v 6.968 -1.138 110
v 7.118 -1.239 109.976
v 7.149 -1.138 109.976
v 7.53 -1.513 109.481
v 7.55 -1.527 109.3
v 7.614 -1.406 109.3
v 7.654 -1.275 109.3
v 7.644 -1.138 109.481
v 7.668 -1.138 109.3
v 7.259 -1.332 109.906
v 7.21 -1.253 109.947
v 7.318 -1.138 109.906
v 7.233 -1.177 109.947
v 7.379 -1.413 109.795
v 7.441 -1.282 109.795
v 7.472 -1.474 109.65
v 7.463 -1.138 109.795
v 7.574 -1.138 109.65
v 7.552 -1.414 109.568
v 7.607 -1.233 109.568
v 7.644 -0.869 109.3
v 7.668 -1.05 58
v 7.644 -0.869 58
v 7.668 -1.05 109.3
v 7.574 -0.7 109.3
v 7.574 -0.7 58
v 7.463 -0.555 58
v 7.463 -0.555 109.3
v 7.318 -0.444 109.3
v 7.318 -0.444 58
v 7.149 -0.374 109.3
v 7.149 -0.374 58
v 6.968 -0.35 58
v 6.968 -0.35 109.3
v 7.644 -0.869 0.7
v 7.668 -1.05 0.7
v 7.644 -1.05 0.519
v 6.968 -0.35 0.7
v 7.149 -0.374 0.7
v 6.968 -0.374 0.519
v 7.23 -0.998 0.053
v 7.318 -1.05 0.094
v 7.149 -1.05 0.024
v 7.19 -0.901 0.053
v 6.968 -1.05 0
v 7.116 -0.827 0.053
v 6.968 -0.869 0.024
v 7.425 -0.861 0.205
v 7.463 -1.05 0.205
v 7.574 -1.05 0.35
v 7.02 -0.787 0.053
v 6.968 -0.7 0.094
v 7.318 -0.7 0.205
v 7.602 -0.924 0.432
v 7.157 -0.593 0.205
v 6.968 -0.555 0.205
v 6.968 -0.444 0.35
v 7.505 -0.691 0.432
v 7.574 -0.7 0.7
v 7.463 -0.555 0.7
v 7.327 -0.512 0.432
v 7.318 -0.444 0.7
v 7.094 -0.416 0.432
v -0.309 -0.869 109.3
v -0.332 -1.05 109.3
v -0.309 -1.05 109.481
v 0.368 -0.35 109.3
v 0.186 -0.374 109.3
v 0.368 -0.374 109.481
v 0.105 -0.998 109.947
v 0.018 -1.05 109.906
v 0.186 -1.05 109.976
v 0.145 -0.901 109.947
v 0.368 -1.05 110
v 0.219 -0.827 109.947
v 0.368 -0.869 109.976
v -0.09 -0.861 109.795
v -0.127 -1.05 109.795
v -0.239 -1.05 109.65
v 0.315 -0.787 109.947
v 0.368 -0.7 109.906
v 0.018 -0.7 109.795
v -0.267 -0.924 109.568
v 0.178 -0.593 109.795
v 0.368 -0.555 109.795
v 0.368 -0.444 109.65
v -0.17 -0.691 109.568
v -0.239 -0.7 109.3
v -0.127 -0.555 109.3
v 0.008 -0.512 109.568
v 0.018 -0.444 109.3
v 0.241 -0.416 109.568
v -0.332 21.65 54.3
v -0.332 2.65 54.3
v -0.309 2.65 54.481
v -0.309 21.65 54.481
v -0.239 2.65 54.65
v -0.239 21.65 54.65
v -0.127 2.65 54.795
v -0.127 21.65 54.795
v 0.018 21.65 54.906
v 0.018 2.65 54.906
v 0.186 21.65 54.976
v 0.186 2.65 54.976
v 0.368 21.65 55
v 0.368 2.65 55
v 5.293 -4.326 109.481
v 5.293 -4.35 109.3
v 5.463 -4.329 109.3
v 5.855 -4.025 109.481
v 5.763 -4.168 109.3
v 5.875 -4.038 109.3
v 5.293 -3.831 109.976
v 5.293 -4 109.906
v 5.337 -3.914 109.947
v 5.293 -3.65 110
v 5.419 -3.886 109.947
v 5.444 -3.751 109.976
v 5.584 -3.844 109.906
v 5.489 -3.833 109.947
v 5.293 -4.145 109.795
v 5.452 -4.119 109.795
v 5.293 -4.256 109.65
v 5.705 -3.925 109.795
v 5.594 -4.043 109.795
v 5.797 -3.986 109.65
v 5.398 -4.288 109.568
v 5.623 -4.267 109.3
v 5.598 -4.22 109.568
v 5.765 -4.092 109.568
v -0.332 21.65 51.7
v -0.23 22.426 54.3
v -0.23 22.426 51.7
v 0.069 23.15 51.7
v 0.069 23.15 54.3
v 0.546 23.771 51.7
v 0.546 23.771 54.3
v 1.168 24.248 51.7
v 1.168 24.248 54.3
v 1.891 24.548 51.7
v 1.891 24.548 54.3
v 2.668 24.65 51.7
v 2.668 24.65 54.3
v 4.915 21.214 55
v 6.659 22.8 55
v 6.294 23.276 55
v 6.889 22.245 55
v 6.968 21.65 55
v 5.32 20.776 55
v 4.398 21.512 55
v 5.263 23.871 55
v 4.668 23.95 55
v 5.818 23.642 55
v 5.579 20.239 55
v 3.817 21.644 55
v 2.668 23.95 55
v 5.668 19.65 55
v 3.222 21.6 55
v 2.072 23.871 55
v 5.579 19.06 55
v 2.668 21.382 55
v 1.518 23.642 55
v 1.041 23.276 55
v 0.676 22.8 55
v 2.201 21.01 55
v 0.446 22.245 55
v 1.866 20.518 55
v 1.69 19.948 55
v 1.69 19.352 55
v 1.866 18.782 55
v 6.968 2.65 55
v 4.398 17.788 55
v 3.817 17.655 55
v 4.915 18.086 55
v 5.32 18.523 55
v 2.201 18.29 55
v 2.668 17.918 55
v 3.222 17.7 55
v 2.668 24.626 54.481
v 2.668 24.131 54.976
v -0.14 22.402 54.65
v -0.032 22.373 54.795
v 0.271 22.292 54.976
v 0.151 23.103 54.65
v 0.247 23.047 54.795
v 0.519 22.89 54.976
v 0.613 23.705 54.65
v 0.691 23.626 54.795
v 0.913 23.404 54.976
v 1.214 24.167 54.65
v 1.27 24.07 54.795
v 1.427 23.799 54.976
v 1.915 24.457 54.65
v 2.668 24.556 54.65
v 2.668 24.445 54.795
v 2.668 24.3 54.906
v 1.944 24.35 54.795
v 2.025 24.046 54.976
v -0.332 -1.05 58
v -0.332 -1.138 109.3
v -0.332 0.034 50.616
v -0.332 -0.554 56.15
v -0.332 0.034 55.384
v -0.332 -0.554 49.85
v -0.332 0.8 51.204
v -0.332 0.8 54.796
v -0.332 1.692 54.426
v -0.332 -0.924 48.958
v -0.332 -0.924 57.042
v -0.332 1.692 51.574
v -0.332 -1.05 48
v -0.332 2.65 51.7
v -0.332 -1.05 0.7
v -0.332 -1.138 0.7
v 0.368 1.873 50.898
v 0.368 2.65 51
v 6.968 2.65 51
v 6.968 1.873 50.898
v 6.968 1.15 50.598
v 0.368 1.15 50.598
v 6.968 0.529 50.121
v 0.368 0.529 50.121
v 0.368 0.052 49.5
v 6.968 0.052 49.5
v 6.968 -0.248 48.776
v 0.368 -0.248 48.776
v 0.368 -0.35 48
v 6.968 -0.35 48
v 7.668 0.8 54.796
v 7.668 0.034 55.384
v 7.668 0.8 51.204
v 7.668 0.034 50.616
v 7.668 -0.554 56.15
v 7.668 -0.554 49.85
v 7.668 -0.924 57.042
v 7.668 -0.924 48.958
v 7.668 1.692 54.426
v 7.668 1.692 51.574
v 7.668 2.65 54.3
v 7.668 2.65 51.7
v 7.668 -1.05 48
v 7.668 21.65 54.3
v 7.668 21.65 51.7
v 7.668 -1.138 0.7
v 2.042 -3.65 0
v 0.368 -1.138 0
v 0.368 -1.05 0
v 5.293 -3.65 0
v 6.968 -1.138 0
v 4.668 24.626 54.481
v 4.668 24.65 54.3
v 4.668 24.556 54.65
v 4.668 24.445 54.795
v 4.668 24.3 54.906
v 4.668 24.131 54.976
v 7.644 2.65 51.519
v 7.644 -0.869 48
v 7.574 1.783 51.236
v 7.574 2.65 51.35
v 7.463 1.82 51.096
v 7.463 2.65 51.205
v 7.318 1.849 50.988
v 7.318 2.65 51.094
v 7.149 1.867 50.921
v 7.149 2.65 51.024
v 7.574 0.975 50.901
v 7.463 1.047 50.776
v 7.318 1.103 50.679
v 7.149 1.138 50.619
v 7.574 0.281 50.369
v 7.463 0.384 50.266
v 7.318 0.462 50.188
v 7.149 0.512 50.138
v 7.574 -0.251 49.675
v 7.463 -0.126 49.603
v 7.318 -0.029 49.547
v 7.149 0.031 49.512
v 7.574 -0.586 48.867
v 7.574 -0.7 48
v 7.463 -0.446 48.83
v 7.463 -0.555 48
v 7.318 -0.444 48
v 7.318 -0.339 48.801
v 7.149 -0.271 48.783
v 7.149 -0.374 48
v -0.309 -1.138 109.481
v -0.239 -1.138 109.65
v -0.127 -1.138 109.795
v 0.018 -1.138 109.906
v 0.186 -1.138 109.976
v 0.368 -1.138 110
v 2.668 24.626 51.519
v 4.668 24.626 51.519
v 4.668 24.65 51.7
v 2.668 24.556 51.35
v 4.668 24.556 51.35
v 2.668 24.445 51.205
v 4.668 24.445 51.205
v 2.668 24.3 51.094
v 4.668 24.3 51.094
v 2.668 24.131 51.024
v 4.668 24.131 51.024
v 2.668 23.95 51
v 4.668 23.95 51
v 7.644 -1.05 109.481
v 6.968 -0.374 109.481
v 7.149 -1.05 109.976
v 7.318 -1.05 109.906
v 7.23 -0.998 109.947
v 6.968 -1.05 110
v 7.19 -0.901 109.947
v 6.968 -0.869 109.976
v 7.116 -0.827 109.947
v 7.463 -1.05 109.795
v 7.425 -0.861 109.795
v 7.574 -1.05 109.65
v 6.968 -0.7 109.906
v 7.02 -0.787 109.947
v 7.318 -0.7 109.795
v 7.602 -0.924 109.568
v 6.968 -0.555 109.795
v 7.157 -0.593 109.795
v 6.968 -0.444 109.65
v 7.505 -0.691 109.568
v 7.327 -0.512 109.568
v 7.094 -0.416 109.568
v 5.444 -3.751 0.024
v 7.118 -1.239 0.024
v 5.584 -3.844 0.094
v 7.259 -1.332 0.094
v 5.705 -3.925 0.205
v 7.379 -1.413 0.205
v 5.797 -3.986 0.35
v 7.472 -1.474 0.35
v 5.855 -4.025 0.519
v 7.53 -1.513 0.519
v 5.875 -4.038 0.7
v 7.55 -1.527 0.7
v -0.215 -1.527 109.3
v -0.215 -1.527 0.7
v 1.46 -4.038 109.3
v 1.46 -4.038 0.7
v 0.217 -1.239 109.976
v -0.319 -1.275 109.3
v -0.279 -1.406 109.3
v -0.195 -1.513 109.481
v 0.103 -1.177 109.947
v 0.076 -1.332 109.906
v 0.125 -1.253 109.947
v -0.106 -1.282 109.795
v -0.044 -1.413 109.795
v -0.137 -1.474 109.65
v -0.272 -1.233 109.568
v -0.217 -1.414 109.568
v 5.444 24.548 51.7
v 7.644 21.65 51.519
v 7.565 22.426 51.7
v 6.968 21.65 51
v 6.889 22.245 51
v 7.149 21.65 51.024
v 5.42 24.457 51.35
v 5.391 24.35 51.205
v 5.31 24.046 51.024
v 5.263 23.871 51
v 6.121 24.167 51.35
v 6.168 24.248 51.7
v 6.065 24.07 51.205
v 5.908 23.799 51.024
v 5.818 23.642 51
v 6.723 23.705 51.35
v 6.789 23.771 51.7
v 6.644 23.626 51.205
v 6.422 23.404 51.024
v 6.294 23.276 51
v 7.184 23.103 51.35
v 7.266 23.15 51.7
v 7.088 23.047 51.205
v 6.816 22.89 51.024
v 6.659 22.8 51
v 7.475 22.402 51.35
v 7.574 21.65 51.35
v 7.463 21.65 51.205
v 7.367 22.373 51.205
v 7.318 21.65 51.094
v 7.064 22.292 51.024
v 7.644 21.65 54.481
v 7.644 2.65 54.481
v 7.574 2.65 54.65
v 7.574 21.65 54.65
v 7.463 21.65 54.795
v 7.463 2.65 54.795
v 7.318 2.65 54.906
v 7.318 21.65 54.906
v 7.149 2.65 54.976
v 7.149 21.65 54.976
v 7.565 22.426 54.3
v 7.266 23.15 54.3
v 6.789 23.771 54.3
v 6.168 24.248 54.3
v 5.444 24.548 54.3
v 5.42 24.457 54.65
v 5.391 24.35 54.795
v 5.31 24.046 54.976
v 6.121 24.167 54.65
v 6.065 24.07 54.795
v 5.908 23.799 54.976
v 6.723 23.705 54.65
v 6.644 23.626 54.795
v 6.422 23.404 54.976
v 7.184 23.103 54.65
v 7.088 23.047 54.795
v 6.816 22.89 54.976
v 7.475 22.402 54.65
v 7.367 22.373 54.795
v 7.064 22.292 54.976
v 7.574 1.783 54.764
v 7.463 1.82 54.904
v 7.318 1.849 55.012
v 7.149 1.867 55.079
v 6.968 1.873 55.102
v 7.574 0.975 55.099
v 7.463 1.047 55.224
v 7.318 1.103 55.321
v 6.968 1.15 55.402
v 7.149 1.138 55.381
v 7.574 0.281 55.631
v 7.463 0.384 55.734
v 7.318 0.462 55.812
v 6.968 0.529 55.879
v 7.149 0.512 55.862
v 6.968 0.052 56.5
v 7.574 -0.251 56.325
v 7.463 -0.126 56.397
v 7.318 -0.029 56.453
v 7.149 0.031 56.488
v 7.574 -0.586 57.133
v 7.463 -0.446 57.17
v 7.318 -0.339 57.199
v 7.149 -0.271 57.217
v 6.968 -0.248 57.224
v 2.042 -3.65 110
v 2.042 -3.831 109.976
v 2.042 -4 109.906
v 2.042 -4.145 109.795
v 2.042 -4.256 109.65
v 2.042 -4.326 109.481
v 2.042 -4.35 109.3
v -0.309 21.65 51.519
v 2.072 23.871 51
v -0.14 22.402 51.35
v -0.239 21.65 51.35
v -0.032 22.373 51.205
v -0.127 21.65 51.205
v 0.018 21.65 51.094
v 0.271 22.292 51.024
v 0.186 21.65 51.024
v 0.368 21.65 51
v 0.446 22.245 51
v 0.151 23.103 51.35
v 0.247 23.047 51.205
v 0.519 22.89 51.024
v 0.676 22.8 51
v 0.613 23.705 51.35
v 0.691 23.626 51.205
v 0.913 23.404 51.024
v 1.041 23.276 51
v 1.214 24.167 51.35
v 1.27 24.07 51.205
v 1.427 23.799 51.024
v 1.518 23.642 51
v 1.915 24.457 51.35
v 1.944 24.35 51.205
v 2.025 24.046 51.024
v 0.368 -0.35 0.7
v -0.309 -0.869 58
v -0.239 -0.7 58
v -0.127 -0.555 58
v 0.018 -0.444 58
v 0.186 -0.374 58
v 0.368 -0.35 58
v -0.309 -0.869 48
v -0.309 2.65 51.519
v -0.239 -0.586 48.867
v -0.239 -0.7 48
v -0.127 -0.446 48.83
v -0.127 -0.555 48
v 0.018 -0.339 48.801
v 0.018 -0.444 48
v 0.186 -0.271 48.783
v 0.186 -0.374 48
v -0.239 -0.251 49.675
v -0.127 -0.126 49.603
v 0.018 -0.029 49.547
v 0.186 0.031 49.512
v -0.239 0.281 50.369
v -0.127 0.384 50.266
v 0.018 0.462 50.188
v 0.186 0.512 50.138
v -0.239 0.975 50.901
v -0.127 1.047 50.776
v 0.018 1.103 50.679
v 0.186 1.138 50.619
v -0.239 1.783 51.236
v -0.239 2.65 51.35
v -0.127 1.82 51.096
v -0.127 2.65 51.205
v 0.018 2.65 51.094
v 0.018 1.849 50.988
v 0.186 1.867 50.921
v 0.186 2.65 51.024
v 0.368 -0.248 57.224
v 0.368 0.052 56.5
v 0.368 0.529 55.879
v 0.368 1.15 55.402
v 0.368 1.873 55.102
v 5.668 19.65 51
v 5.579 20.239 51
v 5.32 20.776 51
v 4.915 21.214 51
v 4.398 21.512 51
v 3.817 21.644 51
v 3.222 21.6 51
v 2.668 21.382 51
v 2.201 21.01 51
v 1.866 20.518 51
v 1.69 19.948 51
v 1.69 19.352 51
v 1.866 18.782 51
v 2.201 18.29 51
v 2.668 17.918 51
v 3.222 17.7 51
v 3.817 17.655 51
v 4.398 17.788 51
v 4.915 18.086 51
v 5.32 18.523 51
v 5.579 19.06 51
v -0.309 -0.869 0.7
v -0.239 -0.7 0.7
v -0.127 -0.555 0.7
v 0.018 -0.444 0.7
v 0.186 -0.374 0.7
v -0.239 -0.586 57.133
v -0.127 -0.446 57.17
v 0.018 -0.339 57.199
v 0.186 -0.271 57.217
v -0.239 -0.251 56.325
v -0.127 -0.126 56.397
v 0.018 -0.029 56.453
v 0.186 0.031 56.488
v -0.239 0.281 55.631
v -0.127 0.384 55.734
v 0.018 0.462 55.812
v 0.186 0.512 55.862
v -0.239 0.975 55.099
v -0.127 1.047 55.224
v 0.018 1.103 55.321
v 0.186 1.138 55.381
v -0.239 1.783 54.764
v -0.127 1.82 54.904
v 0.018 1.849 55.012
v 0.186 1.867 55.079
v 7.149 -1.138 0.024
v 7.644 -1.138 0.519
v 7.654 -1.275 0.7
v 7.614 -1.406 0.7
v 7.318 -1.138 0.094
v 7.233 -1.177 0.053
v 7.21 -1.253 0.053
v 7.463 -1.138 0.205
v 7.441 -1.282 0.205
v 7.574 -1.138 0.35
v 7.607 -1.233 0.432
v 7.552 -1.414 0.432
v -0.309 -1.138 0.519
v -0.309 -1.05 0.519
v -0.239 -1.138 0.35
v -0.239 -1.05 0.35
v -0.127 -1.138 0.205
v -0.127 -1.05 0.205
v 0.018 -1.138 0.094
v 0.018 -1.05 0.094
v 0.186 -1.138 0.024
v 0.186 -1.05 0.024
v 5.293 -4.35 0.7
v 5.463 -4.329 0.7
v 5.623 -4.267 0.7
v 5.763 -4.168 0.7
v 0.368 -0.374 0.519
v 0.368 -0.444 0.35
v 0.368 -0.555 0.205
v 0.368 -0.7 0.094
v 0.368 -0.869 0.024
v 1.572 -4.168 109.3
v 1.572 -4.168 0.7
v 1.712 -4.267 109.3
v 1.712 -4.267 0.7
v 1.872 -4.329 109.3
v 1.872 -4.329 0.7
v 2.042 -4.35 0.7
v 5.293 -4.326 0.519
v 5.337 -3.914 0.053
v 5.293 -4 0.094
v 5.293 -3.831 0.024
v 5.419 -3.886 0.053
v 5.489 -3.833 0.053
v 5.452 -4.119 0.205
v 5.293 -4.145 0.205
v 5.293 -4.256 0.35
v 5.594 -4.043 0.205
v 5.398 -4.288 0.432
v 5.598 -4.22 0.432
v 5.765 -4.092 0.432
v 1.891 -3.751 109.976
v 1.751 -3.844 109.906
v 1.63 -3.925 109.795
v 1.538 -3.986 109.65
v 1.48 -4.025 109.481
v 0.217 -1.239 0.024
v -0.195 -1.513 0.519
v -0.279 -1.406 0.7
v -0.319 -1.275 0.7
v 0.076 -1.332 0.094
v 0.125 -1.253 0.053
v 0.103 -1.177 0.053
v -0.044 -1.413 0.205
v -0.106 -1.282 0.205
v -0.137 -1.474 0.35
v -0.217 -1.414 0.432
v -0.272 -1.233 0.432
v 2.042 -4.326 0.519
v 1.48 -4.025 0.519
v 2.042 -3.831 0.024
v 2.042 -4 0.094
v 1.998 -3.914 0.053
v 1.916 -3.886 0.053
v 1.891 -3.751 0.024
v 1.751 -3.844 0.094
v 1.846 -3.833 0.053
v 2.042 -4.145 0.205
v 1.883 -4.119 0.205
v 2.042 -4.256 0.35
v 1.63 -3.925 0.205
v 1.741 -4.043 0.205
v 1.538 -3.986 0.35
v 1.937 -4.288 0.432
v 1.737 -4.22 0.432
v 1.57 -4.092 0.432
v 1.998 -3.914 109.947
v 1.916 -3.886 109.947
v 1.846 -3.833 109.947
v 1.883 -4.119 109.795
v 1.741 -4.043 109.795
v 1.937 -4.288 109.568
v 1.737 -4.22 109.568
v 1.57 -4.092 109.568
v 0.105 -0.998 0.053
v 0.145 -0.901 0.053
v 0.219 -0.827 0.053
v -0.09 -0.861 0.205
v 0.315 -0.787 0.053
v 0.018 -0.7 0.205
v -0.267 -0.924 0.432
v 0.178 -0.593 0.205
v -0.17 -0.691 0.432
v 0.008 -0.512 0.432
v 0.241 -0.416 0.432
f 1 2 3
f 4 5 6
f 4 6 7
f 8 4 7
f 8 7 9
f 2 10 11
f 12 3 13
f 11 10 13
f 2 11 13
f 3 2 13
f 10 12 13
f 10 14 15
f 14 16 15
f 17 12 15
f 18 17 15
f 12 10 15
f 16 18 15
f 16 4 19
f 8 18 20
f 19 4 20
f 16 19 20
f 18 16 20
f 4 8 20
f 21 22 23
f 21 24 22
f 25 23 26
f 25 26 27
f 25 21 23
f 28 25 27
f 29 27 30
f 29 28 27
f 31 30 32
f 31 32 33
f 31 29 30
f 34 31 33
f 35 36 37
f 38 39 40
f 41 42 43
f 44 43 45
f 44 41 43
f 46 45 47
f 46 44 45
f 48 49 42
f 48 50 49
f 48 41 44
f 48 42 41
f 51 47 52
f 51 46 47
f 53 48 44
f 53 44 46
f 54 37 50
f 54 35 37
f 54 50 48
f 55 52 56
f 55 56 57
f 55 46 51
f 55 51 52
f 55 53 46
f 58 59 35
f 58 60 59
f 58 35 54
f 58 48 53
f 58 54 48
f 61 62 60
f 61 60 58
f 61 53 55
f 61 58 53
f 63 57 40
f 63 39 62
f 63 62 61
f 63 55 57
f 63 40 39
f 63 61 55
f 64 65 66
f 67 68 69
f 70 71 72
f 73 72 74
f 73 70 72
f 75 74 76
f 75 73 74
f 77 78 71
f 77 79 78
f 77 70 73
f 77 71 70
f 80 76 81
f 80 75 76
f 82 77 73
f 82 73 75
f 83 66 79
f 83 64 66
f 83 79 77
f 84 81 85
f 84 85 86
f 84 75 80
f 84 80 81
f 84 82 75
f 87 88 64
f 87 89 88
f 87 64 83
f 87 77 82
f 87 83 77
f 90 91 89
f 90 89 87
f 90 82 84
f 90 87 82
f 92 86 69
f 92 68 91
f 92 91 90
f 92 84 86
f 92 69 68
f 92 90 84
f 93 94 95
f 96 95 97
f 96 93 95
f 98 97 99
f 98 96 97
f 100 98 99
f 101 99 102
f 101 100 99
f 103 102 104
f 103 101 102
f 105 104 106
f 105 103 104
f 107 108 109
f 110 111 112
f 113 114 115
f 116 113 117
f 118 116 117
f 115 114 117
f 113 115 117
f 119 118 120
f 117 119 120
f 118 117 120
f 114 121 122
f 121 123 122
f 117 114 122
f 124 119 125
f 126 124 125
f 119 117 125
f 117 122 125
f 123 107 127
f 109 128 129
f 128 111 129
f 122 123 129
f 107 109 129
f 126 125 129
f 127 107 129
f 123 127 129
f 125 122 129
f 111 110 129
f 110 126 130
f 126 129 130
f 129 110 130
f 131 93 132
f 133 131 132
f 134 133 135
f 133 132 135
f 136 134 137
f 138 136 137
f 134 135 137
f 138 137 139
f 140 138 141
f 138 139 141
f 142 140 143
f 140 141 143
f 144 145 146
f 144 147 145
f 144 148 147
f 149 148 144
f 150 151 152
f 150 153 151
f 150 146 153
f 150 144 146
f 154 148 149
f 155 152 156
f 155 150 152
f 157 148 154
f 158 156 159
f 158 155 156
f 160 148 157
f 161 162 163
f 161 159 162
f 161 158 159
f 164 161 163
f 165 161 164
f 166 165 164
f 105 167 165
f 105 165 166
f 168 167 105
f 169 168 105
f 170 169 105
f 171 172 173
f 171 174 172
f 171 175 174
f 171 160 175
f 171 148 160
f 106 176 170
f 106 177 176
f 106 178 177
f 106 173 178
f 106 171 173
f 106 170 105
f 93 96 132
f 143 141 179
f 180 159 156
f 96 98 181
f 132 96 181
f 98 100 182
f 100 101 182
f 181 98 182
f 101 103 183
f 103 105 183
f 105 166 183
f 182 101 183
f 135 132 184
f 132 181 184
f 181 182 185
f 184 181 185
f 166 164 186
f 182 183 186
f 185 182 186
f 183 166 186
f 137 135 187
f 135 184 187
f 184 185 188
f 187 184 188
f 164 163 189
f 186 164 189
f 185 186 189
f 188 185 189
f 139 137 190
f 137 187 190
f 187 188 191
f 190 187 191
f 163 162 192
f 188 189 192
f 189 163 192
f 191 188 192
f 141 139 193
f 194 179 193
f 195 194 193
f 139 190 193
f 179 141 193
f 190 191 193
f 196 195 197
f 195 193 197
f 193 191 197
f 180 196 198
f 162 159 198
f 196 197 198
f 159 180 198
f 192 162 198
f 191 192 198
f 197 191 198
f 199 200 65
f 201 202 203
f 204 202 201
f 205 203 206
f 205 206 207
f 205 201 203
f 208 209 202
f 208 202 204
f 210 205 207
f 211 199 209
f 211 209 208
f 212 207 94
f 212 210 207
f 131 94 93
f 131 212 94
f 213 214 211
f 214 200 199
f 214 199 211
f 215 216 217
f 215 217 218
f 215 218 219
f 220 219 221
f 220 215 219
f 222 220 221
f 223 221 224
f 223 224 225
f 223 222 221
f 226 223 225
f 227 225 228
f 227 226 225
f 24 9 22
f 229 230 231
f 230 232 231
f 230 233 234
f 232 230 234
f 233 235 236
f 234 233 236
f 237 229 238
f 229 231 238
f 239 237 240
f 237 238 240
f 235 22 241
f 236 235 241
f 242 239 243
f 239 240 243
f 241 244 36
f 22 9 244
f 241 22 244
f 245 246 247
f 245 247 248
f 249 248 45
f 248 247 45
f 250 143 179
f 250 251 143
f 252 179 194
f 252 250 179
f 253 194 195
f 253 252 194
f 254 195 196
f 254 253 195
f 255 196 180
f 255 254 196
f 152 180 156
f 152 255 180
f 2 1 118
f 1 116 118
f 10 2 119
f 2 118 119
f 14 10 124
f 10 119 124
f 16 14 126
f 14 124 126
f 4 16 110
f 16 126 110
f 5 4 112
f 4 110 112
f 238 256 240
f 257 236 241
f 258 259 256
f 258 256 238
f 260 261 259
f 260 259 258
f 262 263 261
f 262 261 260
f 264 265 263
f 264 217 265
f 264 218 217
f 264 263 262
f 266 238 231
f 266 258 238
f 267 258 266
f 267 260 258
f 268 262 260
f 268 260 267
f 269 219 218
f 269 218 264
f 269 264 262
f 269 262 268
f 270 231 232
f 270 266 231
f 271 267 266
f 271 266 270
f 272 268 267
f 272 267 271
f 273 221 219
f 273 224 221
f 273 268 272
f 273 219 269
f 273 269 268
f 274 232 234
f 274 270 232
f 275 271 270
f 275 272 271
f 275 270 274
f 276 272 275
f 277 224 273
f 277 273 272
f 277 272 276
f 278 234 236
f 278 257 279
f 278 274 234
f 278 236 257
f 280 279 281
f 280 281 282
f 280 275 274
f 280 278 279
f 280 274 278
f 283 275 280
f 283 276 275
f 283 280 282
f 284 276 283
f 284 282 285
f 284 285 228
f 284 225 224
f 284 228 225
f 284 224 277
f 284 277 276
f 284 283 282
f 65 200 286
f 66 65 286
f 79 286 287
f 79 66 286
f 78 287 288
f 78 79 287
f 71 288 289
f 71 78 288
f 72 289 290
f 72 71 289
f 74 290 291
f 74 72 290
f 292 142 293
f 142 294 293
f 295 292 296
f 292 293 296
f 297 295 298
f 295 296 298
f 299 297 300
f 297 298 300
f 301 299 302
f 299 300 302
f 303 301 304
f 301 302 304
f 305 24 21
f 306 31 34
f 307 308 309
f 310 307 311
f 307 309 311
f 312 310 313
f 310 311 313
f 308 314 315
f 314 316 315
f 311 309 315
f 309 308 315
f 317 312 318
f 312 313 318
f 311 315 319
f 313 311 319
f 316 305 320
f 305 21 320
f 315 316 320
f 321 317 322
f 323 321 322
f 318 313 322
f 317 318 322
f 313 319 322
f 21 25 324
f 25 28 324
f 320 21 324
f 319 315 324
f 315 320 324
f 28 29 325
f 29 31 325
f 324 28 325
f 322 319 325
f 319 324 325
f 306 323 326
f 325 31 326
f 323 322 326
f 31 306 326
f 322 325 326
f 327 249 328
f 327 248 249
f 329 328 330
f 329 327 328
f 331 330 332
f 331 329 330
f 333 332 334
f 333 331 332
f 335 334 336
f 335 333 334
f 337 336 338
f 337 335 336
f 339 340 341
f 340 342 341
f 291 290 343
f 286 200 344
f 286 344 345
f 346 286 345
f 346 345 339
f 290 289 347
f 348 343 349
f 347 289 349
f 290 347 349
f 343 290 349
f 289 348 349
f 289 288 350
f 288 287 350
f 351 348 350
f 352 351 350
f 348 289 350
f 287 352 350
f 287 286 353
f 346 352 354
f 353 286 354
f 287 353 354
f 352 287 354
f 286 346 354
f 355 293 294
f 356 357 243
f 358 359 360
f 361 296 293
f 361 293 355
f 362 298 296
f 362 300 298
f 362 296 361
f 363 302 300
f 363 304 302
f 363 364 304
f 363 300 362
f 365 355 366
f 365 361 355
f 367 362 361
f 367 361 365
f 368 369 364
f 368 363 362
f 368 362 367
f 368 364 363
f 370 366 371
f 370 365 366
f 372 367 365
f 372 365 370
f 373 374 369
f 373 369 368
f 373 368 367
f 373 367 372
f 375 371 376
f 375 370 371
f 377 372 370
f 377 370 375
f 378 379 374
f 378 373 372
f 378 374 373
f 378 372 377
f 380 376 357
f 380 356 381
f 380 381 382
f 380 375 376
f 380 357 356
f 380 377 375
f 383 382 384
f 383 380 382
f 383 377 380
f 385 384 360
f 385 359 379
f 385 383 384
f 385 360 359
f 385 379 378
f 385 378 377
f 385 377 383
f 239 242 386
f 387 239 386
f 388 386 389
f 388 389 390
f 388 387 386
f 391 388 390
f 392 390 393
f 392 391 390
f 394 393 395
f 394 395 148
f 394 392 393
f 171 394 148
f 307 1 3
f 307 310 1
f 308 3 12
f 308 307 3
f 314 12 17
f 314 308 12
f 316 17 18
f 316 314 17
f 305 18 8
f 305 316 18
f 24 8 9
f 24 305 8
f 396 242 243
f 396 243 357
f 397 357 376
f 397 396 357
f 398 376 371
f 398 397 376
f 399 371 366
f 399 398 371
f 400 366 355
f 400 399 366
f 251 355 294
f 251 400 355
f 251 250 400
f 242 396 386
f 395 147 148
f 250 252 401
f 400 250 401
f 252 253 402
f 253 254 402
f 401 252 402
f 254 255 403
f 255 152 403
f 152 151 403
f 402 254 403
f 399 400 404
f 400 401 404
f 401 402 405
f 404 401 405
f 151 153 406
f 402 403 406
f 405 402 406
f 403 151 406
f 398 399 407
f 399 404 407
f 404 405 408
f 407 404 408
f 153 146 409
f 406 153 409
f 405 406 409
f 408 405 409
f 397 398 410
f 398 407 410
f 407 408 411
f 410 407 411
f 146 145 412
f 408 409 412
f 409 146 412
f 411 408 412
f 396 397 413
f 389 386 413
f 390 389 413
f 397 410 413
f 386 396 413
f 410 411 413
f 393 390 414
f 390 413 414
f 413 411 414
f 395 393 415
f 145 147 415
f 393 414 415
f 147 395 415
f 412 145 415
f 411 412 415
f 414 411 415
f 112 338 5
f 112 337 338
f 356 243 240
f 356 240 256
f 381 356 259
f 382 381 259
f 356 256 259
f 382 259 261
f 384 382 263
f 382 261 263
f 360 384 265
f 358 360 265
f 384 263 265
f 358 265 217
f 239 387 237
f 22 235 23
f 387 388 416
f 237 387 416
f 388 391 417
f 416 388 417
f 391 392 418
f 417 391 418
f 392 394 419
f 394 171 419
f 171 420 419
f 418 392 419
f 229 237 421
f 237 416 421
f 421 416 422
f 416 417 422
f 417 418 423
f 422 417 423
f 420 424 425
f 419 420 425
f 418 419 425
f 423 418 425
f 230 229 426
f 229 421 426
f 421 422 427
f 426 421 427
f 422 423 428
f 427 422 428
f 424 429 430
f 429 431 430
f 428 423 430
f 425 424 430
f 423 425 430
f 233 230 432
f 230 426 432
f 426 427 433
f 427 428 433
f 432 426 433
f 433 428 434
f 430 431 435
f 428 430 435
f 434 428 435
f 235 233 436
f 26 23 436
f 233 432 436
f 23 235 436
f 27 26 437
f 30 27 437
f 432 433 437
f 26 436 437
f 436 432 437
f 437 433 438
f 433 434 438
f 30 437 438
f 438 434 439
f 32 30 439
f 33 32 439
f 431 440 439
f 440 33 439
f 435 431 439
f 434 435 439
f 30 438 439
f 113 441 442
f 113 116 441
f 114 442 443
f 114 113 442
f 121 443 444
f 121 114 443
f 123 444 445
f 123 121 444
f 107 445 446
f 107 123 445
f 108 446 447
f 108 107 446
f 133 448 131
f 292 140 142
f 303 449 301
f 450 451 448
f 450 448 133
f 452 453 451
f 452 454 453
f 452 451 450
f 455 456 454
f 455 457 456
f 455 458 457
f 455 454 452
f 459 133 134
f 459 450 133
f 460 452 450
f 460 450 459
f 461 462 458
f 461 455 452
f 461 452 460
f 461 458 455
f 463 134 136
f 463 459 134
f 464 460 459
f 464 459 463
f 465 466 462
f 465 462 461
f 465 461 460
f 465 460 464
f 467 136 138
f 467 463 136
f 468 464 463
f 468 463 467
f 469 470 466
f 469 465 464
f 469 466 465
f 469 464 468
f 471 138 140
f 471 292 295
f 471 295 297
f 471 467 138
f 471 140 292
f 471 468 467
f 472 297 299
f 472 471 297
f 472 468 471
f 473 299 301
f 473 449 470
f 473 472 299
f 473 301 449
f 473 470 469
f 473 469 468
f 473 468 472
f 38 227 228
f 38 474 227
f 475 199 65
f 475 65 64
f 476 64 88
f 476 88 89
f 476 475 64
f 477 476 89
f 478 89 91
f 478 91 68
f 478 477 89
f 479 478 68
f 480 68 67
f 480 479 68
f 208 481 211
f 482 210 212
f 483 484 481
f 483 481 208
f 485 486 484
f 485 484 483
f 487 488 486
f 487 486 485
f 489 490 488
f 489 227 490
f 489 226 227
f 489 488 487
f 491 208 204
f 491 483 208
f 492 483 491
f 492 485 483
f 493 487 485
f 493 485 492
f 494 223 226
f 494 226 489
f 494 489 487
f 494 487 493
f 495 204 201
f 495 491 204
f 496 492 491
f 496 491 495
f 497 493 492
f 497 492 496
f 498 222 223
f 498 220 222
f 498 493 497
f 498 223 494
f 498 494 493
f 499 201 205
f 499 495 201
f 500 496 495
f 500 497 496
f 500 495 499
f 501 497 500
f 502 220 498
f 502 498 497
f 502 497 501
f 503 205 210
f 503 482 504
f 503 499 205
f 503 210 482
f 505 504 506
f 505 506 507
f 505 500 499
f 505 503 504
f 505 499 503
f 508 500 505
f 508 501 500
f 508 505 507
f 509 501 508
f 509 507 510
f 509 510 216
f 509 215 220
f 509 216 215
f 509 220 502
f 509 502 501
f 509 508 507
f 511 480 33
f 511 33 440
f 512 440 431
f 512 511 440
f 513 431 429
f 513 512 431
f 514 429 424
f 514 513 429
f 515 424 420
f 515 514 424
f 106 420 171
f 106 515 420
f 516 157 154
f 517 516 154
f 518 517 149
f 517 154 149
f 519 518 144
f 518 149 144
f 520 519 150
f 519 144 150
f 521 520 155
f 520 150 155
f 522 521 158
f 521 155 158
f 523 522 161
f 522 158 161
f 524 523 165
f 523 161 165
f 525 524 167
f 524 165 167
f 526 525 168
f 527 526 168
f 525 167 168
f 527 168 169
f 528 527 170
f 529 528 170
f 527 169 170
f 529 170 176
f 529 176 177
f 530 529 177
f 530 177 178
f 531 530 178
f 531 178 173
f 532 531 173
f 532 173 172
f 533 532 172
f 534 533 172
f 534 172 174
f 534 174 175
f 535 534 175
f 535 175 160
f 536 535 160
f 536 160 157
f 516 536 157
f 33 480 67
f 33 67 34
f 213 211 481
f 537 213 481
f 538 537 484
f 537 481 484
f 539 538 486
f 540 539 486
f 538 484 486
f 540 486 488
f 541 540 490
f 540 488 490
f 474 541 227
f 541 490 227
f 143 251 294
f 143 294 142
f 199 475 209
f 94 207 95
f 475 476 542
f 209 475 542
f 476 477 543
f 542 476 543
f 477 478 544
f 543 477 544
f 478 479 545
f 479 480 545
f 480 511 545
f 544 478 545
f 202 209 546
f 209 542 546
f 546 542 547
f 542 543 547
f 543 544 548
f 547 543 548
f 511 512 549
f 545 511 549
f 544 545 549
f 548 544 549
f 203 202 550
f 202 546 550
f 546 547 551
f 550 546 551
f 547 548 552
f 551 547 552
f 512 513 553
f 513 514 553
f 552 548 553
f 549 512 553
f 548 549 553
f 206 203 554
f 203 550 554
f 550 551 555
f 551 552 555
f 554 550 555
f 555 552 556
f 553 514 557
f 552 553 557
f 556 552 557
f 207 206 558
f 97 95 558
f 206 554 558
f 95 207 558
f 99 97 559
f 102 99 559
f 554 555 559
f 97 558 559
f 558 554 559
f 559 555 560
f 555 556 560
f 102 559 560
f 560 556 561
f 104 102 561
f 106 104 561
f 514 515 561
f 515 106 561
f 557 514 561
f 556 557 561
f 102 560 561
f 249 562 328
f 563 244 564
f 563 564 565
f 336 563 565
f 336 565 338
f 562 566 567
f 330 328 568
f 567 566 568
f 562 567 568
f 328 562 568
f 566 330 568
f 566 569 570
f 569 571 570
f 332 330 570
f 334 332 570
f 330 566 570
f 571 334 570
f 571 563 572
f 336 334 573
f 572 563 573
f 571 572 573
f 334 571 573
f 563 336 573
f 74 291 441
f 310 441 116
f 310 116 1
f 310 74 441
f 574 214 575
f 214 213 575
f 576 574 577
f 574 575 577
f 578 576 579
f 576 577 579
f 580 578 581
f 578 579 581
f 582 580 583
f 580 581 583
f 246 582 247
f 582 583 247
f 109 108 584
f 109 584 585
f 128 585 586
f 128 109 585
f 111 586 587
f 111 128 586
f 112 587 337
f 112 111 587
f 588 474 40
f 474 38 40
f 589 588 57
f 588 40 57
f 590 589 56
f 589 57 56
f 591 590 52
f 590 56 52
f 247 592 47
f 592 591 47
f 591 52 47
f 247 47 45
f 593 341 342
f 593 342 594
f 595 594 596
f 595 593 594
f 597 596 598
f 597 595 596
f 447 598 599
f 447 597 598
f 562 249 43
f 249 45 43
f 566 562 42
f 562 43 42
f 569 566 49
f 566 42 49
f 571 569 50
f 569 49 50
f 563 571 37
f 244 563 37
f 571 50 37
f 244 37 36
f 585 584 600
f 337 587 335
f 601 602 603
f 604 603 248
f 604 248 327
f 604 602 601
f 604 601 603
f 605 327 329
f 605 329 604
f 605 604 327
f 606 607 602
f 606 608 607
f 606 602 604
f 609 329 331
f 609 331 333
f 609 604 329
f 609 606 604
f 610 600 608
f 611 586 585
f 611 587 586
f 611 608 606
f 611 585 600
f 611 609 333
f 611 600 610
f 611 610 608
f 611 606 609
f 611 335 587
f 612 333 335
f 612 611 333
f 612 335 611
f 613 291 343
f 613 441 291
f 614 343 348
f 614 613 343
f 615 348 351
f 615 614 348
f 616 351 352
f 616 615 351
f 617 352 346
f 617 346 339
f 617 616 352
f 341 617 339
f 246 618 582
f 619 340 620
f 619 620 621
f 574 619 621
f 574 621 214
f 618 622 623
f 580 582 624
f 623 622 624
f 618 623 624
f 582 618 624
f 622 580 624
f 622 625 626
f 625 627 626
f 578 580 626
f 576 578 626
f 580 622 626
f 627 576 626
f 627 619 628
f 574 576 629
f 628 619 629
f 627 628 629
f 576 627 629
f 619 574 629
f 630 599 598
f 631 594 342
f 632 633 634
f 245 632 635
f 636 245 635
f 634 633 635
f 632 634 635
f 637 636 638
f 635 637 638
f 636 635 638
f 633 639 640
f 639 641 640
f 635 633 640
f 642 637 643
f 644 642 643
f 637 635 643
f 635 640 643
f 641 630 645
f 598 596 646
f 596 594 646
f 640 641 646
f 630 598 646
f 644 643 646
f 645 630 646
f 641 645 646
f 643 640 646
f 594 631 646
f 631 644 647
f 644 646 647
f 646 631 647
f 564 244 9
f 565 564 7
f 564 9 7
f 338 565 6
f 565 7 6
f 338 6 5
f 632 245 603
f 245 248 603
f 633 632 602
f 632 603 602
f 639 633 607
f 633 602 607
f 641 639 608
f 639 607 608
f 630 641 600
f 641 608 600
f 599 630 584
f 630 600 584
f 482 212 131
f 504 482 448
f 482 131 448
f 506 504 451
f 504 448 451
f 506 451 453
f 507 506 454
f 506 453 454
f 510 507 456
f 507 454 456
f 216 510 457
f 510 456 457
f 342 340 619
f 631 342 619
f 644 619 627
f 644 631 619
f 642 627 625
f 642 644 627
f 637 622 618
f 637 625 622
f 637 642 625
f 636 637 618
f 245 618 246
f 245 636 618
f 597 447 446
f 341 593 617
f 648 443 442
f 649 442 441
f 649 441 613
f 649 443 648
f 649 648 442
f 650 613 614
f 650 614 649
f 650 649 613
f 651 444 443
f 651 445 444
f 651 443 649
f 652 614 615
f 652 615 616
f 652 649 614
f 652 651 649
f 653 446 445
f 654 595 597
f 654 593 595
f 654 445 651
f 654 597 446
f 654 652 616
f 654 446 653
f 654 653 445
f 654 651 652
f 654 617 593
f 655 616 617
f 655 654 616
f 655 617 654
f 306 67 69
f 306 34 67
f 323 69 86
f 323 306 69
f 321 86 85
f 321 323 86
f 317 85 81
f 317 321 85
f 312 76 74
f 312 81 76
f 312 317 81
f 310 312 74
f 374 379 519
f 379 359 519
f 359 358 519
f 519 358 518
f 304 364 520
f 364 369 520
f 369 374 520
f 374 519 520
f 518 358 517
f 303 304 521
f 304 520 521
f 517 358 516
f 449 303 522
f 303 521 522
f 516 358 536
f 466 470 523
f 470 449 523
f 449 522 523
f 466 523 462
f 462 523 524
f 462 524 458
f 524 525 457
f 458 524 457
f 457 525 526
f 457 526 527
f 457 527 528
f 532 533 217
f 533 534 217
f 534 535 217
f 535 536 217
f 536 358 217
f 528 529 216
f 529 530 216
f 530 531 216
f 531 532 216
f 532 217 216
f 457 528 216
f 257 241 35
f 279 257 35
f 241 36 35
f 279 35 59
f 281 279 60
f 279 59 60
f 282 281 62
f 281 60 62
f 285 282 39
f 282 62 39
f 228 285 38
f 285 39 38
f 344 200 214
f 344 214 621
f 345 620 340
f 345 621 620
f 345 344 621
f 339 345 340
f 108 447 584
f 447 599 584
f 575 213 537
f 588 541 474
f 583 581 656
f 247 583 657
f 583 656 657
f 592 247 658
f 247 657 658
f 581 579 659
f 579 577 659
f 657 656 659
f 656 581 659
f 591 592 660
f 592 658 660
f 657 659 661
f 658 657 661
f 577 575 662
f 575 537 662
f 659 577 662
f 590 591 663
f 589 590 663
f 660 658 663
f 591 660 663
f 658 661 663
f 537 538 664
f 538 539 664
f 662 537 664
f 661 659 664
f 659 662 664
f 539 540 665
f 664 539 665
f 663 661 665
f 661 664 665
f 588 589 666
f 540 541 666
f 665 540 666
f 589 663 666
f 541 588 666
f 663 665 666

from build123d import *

# Parameters (mm, degrees)
F0_W       = 8
F0_H       = 4
F1_DEPTH   = 110
F2_W       = 8
F2_H       = 4
F3_DEPTH   = 25
F4_R       = 2
F5_DEPTH   = 55.001
F6_R       = 3
F7_SIZE2   = 2
F7_SIZE    = 3
F7_2_SIZE2 = 2
F7_2_SIZE  = 3
F8_R       = 3
F9_R       = 0.7


with BuildPart() as f1:
    # F0 (on Top) → F1 (new body)
    with BuildSketch(Plane.XY):
        with Locations((3.6675264128, -2.3501528167)):
            Rectangle(F0_W, F0_H)
    extrude(amount=F1_DEPTH)

    # F2 (on face) → F3 (join)
    with BuildSketch(Plane(origin=(0, -0.3501528167, 0), x_dir=(-1, 0, 0), z_dir=(0, 1, 0))):
        with Locations((-3.6675264128, 53)):
            Rectangle(F2_W, F2_H)
    extrude(amount=F3_DEPTH)

    # F4 (on face) → F5 (cut, through all)
    with BuildSketch(Plane.XY.offset(55)):
        with Locations((3.6675264128, 19.6498471833)):
            Circle(F4_R)
    extrude(amount=-F5_DEPTH, mode=Mode.SUBTRACT)

    # F6
    f6_edges = [f1.edges().sort_by_distance(p)[0] for p in [
        (3.667526, -0.350153, 55),
        (3.667526, -0.350153, 51),
    ]]
    fillet(f6_edges, radius=F6_R)

    # F7
    f7_edges = [f1.edges().sort_by_distance(p)[0] for p in [
        (7.667526, -4.350153, 55),
    ]]
    f7_side = f1.faces().sort_by_distance((7.667526, 0.334925, 54.618055))[0]
    chamfer(f7_edges, length=F7_SIZE, length2=F7_SIZE2, reference=f7_side)

    # F7#2
    f7_2_edges = [f1.edges().sort_by_distance(p)[0] for p in [
        (-0.332474, -4.350153, 55),
    ]]
    f7_2_side = f1.faces().sort_by_distance((-0.332474, 0.334925, 54.618055))[0]
    chamfer(f7_2_edges, length=F7_2_SIZE, length2=F7_2_SIZE2, reference=f7_2_side)

    # F8
    f8_edges = [f1.edges().sort_by_distance(p)[0] for p in [
        (7.667526, 24.649847, 53),
        (-0.332474, 24.649847, 53),
    ]]
    fillet(f8_edges, radius=F8_R)

    # F9
    f9_edges = [f1.edges().sort_by_distance(p)[0] for p in [
        (-0.332474, 12.149847, 51),
        (-0.332474, 21.649847, 53),
        (-0.332474, 0.528527, 50.12132),
        (-0.332474, 12.149847, 55),
        (-0.332474, -0.350153, 24),
        (-0.332474, 0.528527, 55.87868),
        (-0.332474, -0.850153, 0),
        (-0.332474, -0.350153, 84),
        (-0.332474, -1.350153, 55),
        (-0.332474, -0.850153, 110),
        (7.667526, 12.149847, 55),
        (7.667526, 21.649847, 53),
        (7.667526, 0.528527, 55.87868),
        (7.667526, 12.149847, 51),
        (7.667526, -0.350153, 84),
        (7.667526, 0.528527, 50.12132),
        (7.667526, -0.850153, 110),
        (7.667526, -0.350153, 24),
        (7.667526, -1.350153, 55),
        (7.667526, -0.850153, 0),
        (3.667526, -4.350153, 110),
        (0.667526, -2.850153, 110),
        (6.667526, -2.850153, 110),
        (3.667526, -0.350153, 110),
        (3.667526, -4.350153, 0),
        (0.667526, -2.850153, 0),
        (6.667526, -2.850153, 0),
        (3.667526, -0.350153, 0),
        (1.667526, -4.350153, 55),
        (5.667526, -4.350153, 55),
    ]]
    fillet(f9_edges, radius=F9_R)


solid = f1.part
